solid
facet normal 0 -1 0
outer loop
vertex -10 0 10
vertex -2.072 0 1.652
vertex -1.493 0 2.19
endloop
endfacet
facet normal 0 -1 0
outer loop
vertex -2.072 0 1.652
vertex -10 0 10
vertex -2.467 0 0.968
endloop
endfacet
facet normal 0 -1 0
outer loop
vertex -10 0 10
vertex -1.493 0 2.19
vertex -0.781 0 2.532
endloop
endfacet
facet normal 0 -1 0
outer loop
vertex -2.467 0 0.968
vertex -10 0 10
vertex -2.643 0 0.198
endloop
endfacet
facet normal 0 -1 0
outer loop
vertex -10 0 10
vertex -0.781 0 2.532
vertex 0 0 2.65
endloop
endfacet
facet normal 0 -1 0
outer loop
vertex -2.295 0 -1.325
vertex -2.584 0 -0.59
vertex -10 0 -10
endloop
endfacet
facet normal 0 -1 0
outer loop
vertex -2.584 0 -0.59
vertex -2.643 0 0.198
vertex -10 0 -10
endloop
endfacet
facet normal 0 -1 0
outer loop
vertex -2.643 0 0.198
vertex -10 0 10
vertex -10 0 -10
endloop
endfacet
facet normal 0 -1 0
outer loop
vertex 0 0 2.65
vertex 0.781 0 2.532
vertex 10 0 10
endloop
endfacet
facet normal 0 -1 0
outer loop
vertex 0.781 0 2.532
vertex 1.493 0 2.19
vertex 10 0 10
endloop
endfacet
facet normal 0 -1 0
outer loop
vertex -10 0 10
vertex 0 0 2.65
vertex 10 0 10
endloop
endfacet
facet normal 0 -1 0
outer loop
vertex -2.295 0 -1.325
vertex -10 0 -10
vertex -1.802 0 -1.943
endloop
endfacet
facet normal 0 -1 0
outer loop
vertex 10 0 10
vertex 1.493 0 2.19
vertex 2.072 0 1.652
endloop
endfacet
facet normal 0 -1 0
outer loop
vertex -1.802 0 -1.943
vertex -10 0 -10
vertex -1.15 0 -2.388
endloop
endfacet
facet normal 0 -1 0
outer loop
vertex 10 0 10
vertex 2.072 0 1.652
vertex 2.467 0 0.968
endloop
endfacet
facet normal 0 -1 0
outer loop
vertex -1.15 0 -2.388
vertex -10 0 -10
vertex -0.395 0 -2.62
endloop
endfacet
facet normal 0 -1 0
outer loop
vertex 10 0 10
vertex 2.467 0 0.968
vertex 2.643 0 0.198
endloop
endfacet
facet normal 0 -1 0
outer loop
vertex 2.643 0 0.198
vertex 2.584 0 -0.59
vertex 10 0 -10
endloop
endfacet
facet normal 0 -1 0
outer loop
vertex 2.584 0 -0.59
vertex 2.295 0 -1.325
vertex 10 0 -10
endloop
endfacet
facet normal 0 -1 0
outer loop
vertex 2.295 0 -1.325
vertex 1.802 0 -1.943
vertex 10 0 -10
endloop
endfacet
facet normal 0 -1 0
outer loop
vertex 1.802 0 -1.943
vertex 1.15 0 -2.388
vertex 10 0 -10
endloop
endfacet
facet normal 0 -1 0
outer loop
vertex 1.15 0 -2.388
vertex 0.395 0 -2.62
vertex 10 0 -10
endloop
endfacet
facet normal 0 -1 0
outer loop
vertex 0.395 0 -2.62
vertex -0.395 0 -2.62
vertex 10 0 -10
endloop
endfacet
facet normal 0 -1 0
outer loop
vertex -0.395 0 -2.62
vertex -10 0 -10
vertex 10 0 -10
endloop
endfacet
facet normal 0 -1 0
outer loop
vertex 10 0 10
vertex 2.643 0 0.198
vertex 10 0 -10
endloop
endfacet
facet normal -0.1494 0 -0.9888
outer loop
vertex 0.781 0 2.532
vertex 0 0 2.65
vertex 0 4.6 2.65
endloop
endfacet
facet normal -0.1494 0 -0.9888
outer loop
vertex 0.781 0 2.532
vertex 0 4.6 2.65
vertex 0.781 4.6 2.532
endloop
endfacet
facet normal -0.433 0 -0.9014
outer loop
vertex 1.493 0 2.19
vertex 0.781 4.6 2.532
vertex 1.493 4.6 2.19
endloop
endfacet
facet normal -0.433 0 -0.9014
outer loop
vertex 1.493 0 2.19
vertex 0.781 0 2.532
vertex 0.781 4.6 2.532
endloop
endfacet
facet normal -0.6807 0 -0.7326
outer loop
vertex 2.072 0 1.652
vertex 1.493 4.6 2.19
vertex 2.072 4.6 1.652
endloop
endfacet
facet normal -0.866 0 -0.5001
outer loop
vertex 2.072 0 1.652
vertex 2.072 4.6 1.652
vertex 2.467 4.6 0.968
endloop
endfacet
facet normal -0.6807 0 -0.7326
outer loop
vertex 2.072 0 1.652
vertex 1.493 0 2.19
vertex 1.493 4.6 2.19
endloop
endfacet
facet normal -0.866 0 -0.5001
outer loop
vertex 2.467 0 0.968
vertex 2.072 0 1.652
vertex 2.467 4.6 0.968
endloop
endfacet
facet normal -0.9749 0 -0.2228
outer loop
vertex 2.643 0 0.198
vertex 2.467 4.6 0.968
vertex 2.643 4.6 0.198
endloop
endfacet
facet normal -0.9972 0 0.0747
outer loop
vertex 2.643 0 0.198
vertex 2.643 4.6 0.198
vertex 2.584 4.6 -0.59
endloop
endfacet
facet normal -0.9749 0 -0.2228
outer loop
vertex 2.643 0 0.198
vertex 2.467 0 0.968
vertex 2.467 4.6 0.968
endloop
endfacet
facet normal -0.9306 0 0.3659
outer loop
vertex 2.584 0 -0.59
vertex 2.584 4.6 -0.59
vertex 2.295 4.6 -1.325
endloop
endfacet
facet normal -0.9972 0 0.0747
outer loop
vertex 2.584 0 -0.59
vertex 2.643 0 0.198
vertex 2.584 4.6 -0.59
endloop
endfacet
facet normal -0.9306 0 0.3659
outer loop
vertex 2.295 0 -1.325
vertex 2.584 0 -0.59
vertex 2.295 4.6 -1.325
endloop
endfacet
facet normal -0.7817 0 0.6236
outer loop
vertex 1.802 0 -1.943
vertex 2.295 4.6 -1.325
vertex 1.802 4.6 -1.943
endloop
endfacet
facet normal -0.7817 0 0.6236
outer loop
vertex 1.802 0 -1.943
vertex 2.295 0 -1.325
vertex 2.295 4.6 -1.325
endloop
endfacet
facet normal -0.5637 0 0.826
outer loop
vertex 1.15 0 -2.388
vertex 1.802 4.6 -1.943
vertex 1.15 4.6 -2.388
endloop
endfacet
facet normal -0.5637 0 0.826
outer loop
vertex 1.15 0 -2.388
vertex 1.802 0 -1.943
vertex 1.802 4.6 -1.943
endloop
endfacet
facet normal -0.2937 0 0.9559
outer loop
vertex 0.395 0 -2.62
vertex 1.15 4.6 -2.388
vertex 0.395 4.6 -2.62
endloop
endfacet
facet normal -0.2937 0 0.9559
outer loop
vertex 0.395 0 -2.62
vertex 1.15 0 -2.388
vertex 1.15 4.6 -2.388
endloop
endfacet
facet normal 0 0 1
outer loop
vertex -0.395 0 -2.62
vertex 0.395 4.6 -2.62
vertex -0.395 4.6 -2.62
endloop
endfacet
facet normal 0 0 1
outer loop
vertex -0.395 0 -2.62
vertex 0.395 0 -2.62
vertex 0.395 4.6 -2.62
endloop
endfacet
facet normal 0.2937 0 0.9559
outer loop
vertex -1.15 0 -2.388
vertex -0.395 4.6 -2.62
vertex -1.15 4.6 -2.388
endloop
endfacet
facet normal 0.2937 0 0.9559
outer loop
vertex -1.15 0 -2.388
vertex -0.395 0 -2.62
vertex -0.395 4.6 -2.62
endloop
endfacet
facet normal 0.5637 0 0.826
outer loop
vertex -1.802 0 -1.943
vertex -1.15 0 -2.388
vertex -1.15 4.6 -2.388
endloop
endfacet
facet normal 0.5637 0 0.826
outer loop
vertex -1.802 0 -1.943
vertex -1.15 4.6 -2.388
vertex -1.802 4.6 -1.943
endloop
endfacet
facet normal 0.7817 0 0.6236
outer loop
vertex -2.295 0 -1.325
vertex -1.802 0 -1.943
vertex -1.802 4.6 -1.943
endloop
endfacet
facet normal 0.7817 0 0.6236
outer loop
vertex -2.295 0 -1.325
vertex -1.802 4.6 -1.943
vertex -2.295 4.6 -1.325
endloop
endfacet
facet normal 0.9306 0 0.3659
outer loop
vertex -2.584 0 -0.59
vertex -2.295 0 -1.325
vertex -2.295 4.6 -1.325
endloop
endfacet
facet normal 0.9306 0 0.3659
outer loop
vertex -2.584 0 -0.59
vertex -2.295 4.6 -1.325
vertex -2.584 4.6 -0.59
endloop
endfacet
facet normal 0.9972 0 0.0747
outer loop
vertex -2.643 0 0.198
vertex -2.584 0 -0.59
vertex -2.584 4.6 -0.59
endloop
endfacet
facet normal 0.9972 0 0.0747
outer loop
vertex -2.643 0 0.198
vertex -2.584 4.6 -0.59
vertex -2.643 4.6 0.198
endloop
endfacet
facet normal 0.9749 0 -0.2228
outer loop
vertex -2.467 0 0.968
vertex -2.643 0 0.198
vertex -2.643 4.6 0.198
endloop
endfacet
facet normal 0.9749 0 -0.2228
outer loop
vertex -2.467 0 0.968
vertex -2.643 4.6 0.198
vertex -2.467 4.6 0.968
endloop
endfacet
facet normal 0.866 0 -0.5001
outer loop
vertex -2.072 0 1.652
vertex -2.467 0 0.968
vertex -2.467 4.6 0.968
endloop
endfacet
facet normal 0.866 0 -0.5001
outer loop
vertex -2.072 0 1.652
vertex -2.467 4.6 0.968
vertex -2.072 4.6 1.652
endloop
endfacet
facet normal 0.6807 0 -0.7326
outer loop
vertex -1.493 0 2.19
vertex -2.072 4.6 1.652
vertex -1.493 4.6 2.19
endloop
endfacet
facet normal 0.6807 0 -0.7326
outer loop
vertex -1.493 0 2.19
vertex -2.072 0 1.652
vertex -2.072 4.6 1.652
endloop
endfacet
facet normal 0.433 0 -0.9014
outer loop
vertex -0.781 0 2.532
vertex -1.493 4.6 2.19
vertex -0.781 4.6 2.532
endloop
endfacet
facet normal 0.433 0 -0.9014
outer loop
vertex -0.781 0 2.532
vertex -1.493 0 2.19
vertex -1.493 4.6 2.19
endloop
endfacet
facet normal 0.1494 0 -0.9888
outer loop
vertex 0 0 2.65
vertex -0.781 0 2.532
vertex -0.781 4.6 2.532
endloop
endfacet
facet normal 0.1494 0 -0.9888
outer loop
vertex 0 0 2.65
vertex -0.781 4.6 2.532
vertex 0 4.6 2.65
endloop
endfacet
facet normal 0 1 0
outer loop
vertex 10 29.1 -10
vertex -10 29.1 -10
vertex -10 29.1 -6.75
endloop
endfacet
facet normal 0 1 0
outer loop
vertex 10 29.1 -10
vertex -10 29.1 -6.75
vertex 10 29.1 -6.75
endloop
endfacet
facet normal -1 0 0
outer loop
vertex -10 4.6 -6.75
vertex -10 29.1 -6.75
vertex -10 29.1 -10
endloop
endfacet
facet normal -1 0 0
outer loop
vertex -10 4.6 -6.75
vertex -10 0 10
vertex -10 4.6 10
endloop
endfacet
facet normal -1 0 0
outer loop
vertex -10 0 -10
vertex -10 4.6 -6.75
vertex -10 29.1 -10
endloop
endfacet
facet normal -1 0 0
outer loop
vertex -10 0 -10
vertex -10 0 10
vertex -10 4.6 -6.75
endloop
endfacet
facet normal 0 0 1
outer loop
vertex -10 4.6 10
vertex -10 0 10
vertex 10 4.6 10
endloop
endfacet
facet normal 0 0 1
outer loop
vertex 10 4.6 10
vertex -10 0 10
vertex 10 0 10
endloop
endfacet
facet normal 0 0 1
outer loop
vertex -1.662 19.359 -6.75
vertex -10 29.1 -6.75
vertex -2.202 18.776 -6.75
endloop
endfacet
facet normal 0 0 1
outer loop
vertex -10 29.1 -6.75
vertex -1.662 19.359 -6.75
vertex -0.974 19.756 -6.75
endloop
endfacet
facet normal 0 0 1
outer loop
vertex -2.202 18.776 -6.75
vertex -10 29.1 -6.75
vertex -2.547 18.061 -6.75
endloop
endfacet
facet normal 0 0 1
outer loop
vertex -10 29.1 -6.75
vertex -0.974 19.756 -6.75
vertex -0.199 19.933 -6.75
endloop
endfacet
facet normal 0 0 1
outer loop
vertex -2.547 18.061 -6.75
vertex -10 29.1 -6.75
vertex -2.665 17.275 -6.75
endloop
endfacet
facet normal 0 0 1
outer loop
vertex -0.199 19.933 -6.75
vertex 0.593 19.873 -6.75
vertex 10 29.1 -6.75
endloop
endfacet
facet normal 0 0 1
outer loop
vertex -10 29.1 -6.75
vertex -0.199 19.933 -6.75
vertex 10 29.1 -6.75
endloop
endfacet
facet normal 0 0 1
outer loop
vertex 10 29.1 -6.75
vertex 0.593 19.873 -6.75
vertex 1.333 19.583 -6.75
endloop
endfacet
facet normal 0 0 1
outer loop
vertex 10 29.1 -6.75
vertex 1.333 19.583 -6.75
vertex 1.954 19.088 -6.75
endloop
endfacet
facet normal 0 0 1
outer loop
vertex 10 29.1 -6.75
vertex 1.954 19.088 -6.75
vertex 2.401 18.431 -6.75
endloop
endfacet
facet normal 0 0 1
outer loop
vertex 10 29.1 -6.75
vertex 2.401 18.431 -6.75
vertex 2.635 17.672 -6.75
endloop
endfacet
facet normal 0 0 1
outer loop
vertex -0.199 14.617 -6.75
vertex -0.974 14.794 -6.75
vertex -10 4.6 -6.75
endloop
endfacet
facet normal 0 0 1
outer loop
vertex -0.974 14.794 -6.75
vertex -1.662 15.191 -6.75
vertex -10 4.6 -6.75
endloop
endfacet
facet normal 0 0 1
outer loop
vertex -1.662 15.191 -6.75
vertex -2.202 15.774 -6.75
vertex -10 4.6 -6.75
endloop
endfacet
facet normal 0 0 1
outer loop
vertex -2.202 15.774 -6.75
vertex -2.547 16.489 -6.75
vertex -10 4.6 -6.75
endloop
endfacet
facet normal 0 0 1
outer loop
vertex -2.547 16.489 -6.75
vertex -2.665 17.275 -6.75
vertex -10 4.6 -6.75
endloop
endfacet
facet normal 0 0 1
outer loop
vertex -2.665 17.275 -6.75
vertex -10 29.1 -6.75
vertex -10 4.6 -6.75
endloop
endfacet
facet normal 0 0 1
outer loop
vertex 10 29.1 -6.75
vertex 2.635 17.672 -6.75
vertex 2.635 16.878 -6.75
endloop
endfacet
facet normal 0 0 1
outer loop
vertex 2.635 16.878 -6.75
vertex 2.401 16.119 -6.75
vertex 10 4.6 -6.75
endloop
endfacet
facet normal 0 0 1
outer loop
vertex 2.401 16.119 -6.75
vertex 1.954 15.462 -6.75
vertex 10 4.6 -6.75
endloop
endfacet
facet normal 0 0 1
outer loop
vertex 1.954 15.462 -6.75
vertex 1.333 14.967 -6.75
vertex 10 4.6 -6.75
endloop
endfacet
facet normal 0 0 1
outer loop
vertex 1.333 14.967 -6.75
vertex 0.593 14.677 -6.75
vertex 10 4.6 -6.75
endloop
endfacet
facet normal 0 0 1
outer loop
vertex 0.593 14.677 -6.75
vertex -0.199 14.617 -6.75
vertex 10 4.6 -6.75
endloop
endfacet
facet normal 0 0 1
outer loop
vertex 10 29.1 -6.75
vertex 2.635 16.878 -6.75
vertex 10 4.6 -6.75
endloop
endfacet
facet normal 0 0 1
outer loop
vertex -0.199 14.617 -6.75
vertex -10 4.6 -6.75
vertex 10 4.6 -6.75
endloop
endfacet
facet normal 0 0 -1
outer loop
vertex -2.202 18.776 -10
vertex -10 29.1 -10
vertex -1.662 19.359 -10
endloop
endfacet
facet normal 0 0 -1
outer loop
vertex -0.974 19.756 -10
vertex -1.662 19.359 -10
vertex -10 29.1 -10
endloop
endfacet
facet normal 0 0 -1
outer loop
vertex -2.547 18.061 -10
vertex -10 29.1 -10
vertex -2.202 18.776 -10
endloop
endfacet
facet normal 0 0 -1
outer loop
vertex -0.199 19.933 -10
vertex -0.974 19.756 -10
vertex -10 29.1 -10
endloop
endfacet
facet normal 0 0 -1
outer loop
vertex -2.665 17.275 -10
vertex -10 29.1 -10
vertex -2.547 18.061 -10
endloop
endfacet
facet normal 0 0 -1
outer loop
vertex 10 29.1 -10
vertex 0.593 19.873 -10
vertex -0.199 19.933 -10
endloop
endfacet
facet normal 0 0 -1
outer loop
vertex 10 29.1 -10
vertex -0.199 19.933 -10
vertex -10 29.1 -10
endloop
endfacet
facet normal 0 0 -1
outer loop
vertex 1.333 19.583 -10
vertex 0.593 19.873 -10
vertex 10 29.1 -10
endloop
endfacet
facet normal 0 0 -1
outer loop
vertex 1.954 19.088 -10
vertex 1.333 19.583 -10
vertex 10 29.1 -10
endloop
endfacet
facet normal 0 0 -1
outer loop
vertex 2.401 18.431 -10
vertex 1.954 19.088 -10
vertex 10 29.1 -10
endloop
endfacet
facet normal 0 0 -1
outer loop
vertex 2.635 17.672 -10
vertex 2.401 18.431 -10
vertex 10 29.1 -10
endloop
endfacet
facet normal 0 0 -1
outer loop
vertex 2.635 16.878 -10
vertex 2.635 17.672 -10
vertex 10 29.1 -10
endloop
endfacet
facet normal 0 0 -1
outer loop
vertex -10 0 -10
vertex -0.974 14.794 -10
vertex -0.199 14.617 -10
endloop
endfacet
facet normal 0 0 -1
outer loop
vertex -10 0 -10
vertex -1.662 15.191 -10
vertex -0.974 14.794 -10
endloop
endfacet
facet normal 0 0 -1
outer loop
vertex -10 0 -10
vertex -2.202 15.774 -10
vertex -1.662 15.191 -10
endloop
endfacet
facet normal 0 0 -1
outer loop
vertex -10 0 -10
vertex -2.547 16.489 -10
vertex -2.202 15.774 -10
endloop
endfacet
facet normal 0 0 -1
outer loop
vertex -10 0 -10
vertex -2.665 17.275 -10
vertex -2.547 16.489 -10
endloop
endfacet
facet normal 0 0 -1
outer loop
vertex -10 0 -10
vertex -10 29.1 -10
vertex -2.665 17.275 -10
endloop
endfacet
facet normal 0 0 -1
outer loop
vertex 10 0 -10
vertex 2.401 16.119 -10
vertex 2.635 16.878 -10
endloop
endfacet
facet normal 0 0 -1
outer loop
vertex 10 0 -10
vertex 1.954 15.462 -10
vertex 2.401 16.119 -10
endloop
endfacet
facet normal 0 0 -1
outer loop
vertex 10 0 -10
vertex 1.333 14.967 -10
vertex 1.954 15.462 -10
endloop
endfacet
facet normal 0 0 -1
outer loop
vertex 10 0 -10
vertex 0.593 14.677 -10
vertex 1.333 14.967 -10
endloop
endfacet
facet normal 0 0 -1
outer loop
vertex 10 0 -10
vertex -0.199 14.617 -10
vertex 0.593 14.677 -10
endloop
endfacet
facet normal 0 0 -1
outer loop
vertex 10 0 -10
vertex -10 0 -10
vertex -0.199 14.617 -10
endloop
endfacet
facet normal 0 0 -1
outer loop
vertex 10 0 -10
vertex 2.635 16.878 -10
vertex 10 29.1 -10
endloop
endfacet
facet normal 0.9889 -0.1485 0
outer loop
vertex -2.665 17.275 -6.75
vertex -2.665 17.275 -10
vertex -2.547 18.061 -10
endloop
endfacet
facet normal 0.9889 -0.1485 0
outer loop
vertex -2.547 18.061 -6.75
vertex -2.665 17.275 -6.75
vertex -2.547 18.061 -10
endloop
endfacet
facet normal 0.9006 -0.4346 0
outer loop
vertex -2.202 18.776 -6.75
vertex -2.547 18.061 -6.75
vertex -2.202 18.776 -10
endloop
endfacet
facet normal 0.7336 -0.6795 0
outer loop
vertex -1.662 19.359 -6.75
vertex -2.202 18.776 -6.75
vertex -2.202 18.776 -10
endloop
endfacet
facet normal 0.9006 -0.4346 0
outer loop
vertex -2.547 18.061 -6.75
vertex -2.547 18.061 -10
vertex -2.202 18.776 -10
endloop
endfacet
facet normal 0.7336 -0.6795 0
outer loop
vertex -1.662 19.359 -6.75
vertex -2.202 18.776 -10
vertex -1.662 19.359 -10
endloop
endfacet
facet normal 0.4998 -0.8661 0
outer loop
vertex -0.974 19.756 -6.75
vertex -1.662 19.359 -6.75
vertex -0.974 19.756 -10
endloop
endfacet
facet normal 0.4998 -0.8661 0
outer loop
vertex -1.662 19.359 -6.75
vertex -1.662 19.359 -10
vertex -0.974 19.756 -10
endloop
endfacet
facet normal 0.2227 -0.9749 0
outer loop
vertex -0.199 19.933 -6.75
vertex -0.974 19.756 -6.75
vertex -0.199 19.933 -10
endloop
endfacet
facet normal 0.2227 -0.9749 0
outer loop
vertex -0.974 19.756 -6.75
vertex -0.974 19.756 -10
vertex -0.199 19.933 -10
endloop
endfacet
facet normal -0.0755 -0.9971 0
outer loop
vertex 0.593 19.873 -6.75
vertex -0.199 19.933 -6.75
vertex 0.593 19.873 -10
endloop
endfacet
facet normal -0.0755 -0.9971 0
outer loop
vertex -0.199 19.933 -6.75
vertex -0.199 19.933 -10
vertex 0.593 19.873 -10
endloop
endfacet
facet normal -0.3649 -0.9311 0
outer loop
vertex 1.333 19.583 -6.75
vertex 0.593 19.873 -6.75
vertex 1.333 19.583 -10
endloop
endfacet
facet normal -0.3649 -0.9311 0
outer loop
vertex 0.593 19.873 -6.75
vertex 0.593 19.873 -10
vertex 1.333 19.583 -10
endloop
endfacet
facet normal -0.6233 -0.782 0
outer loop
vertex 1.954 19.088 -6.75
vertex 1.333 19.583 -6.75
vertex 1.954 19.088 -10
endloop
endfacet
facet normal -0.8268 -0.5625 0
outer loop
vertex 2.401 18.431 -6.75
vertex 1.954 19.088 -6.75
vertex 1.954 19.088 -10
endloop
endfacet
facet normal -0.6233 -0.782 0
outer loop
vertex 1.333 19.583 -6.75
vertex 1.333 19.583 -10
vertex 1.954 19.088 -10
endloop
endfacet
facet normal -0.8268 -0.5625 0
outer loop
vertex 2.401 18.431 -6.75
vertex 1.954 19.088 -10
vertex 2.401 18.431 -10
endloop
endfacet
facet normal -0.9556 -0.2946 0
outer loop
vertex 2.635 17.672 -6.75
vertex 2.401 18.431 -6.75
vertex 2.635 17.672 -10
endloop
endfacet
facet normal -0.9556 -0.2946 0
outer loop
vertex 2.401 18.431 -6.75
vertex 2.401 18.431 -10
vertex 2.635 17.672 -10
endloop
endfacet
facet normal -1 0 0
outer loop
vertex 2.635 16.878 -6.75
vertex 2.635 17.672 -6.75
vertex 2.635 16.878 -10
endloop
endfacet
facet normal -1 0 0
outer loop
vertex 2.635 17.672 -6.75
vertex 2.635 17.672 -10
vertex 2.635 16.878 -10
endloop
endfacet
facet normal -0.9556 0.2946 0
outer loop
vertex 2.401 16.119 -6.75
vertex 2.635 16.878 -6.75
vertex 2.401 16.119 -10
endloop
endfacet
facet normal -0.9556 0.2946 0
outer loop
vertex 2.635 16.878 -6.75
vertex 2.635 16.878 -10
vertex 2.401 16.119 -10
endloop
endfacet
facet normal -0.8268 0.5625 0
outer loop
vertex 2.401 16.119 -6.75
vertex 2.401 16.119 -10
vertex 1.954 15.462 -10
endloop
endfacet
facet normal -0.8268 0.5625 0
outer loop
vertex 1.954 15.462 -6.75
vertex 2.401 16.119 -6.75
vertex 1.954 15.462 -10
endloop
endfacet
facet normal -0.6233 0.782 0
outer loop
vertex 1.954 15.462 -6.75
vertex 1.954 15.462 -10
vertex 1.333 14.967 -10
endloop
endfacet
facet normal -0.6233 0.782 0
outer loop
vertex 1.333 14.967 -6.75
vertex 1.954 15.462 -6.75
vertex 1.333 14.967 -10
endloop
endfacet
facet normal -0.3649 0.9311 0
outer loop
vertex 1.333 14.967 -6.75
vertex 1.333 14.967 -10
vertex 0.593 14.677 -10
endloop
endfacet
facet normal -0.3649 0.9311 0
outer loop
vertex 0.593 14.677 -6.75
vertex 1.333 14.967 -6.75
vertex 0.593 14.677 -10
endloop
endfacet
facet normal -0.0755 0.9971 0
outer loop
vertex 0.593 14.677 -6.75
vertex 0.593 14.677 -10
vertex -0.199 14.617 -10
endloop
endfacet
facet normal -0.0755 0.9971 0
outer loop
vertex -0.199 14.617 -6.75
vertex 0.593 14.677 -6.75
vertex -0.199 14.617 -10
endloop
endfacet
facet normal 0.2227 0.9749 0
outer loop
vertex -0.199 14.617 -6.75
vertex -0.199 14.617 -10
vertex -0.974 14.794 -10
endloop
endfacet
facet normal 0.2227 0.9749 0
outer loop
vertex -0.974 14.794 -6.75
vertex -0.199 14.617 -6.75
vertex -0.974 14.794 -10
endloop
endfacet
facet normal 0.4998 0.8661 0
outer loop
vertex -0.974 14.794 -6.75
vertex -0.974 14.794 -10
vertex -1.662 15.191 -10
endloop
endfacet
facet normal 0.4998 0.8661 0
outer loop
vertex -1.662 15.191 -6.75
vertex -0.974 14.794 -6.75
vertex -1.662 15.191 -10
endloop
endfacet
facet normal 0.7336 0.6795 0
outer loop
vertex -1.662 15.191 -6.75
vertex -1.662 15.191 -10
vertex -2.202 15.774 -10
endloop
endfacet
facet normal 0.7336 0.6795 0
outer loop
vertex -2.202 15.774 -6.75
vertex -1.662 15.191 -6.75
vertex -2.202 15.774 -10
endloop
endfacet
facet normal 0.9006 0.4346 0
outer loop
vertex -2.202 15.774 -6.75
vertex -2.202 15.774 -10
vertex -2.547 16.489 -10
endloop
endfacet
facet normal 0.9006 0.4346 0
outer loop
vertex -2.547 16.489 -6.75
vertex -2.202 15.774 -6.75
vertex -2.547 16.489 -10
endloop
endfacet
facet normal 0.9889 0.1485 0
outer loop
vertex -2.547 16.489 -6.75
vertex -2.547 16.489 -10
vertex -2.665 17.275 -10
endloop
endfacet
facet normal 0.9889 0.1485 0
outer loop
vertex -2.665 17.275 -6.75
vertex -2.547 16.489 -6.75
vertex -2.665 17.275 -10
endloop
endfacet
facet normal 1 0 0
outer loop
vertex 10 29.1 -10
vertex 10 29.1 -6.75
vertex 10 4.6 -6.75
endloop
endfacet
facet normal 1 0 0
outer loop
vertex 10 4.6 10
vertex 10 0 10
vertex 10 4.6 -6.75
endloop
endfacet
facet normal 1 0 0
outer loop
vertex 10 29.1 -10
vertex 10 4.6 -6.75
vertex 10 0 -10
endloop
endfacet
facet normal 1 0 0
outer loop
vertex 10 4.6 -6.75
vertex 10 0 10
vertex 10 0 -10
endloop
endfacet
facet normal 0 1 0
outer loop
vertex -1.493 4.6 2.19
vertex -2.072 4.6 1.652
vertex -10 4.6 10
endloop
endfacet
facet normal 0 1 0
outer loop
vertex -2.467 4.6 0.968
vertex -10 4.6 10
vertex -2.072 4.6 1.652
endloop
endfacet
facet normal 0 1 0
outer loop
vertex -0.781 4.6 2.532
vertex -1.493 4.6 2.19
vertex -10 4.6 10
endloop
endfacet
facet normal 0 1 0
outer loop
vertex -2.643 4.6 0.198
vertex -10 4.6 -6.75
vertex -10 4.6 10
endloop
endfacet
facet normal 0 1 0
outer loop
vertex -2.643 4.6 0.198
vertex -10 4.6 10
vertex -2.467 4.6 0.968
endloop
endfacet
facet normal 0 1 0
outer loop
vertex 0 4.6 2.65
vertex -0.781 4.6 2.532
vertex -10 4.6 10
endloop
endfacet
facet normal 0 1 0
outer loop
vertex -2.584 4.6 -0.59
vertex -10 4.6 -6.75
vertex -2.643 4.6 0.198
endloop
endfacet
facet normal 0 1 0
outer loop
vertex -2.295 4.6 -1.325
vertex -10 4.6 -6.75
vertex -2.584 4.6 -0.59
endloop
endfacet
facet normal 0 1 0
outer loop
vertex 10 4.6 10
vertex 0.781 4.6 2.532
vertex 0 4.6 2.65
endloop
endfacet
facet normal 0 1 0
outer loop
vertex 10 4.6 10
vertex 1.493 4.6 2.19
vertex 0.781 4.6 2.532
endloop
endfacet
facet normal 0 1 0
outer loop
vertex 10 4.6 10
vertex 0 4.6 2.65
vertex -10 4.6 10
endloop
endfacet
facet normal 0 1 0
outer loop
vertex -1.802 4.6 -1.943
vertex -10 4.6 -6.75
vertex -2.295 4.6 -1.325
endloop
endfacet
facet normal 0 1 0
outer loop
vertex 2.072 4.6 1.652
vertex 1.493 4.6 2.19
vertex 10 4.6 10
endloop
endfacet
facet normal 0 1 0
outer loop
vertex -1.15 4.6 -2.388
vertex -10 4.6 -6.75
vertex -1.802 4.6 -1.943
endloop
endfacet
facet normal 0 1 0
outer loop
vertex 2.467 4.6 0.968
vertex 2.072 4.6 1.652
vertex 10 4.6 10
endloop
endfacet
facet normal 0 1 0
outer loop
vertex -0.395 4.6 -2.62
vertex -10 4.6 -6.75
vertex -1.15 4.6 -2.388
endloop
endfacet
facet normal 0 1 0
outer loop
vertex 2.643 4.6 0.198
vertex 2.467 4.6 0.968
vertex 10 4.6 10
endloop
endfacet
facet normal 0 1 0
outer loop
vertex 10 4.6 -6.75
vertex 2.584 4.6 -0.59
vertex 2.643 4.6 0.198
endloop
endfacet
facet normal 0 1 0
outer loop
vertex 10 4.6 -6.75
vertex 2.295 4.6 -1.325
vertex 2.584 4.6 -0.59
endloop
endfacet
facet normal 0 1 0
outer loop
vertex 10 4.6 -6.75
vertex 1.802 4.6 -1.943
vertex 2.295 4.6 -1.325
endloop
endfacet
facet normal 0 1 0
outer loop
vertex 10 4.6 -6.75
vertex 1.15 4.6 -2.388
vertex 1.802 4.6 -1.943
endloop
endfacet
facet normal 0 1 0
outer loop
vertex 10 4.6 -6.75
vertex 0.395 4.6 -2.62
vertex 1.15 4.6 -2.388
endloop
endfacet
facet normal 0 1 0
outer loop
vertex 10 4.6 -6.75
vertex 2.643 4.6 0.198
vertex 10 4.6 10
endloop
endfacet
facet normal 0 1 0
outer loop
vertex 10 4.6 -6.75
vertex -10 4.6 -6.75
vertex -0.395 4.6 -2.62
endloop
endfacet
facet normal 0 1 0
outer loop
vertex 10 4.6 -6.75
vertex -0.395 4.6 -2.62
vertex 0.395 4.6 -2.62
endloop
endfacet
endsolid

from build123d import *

# Parameters (mm, degrees)
SKETCH1_W           = 20
SKETCH1_H           = 20
SKETCH1_R           = 2.65
BOSS_EXTRUDE1_DEPTH = 4.6
SKETCH2_W           = 20
SKETCH2_H           = 3.25
BOSS_EXTRUDE2_DEPTH = 24.5
SKETCH3_R           = 2.665
CUT_EXTRUDE1_DEPTH  = 37.698910066


with BuildPart() as part:
    # Sketch1 → Boss-Extrude1 (new body)
    with BuildSketch(Plane(origin=(0, 0, 0), x_dir=(1, 0, 0), z_dir=(0, 1, 0))):
        Rectangle(SKETCH1_W, SKETCH1_H)
        with Locations(Location((0, 0, 0), (0, 0, 270))):
            Circle(SKETCH1_R, mode=Mode.SUBTRACT)
    extrude(amount=BOSS_EXTRUDE1_DEPTH)

    # Sketch2 → Boss-Extrude2 (add)
    with BuildSketch(Plane(origin=(0, 4.6, 0), x_dir=(1, 0, 0), z_dir=(0, 1, 0))):
        with Locations((0, 8.375)):
            Rectangle(SKETCH2_W, SKETCH2_H)
    extrude(amount=BOSS_EXTRUDE2_DEPTH)

    # Sketch3 → Cut-Extrude1 (cut, through all)
    with BuildSketch(Plane(origin=(0, 0, -10), x_dir=(-1, 0, 0), z_dir=(0, 0, -1))):
        with Locations((0, 17.275)):
            Circle(SKETCH3_R)
    extrude(amount=-CUT_EXTRUDE1_DEPTH, mode=Mode.SUBTRACT)


solid = part.part
